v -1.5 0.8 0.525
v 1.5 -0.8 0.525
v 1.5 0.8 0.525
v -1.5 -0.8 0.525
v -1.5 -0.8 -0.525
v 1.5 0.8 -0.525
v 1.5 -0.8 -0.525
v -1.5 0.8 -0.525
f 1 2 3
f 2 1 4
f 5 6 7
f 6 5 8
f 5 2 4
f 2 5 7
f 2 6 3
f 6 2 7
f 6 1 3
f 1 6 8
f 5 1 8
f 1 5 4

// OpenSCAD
// Generic SMD package: 3.0 x 1.6 x 1.05 (L x W x H)
// One connected solid, no markings, no chamfers, no extra features.

$fn = 48;

L = 3.0;
W = 1.6;
H = 1.05;

cube([L, W, H], center=true);
